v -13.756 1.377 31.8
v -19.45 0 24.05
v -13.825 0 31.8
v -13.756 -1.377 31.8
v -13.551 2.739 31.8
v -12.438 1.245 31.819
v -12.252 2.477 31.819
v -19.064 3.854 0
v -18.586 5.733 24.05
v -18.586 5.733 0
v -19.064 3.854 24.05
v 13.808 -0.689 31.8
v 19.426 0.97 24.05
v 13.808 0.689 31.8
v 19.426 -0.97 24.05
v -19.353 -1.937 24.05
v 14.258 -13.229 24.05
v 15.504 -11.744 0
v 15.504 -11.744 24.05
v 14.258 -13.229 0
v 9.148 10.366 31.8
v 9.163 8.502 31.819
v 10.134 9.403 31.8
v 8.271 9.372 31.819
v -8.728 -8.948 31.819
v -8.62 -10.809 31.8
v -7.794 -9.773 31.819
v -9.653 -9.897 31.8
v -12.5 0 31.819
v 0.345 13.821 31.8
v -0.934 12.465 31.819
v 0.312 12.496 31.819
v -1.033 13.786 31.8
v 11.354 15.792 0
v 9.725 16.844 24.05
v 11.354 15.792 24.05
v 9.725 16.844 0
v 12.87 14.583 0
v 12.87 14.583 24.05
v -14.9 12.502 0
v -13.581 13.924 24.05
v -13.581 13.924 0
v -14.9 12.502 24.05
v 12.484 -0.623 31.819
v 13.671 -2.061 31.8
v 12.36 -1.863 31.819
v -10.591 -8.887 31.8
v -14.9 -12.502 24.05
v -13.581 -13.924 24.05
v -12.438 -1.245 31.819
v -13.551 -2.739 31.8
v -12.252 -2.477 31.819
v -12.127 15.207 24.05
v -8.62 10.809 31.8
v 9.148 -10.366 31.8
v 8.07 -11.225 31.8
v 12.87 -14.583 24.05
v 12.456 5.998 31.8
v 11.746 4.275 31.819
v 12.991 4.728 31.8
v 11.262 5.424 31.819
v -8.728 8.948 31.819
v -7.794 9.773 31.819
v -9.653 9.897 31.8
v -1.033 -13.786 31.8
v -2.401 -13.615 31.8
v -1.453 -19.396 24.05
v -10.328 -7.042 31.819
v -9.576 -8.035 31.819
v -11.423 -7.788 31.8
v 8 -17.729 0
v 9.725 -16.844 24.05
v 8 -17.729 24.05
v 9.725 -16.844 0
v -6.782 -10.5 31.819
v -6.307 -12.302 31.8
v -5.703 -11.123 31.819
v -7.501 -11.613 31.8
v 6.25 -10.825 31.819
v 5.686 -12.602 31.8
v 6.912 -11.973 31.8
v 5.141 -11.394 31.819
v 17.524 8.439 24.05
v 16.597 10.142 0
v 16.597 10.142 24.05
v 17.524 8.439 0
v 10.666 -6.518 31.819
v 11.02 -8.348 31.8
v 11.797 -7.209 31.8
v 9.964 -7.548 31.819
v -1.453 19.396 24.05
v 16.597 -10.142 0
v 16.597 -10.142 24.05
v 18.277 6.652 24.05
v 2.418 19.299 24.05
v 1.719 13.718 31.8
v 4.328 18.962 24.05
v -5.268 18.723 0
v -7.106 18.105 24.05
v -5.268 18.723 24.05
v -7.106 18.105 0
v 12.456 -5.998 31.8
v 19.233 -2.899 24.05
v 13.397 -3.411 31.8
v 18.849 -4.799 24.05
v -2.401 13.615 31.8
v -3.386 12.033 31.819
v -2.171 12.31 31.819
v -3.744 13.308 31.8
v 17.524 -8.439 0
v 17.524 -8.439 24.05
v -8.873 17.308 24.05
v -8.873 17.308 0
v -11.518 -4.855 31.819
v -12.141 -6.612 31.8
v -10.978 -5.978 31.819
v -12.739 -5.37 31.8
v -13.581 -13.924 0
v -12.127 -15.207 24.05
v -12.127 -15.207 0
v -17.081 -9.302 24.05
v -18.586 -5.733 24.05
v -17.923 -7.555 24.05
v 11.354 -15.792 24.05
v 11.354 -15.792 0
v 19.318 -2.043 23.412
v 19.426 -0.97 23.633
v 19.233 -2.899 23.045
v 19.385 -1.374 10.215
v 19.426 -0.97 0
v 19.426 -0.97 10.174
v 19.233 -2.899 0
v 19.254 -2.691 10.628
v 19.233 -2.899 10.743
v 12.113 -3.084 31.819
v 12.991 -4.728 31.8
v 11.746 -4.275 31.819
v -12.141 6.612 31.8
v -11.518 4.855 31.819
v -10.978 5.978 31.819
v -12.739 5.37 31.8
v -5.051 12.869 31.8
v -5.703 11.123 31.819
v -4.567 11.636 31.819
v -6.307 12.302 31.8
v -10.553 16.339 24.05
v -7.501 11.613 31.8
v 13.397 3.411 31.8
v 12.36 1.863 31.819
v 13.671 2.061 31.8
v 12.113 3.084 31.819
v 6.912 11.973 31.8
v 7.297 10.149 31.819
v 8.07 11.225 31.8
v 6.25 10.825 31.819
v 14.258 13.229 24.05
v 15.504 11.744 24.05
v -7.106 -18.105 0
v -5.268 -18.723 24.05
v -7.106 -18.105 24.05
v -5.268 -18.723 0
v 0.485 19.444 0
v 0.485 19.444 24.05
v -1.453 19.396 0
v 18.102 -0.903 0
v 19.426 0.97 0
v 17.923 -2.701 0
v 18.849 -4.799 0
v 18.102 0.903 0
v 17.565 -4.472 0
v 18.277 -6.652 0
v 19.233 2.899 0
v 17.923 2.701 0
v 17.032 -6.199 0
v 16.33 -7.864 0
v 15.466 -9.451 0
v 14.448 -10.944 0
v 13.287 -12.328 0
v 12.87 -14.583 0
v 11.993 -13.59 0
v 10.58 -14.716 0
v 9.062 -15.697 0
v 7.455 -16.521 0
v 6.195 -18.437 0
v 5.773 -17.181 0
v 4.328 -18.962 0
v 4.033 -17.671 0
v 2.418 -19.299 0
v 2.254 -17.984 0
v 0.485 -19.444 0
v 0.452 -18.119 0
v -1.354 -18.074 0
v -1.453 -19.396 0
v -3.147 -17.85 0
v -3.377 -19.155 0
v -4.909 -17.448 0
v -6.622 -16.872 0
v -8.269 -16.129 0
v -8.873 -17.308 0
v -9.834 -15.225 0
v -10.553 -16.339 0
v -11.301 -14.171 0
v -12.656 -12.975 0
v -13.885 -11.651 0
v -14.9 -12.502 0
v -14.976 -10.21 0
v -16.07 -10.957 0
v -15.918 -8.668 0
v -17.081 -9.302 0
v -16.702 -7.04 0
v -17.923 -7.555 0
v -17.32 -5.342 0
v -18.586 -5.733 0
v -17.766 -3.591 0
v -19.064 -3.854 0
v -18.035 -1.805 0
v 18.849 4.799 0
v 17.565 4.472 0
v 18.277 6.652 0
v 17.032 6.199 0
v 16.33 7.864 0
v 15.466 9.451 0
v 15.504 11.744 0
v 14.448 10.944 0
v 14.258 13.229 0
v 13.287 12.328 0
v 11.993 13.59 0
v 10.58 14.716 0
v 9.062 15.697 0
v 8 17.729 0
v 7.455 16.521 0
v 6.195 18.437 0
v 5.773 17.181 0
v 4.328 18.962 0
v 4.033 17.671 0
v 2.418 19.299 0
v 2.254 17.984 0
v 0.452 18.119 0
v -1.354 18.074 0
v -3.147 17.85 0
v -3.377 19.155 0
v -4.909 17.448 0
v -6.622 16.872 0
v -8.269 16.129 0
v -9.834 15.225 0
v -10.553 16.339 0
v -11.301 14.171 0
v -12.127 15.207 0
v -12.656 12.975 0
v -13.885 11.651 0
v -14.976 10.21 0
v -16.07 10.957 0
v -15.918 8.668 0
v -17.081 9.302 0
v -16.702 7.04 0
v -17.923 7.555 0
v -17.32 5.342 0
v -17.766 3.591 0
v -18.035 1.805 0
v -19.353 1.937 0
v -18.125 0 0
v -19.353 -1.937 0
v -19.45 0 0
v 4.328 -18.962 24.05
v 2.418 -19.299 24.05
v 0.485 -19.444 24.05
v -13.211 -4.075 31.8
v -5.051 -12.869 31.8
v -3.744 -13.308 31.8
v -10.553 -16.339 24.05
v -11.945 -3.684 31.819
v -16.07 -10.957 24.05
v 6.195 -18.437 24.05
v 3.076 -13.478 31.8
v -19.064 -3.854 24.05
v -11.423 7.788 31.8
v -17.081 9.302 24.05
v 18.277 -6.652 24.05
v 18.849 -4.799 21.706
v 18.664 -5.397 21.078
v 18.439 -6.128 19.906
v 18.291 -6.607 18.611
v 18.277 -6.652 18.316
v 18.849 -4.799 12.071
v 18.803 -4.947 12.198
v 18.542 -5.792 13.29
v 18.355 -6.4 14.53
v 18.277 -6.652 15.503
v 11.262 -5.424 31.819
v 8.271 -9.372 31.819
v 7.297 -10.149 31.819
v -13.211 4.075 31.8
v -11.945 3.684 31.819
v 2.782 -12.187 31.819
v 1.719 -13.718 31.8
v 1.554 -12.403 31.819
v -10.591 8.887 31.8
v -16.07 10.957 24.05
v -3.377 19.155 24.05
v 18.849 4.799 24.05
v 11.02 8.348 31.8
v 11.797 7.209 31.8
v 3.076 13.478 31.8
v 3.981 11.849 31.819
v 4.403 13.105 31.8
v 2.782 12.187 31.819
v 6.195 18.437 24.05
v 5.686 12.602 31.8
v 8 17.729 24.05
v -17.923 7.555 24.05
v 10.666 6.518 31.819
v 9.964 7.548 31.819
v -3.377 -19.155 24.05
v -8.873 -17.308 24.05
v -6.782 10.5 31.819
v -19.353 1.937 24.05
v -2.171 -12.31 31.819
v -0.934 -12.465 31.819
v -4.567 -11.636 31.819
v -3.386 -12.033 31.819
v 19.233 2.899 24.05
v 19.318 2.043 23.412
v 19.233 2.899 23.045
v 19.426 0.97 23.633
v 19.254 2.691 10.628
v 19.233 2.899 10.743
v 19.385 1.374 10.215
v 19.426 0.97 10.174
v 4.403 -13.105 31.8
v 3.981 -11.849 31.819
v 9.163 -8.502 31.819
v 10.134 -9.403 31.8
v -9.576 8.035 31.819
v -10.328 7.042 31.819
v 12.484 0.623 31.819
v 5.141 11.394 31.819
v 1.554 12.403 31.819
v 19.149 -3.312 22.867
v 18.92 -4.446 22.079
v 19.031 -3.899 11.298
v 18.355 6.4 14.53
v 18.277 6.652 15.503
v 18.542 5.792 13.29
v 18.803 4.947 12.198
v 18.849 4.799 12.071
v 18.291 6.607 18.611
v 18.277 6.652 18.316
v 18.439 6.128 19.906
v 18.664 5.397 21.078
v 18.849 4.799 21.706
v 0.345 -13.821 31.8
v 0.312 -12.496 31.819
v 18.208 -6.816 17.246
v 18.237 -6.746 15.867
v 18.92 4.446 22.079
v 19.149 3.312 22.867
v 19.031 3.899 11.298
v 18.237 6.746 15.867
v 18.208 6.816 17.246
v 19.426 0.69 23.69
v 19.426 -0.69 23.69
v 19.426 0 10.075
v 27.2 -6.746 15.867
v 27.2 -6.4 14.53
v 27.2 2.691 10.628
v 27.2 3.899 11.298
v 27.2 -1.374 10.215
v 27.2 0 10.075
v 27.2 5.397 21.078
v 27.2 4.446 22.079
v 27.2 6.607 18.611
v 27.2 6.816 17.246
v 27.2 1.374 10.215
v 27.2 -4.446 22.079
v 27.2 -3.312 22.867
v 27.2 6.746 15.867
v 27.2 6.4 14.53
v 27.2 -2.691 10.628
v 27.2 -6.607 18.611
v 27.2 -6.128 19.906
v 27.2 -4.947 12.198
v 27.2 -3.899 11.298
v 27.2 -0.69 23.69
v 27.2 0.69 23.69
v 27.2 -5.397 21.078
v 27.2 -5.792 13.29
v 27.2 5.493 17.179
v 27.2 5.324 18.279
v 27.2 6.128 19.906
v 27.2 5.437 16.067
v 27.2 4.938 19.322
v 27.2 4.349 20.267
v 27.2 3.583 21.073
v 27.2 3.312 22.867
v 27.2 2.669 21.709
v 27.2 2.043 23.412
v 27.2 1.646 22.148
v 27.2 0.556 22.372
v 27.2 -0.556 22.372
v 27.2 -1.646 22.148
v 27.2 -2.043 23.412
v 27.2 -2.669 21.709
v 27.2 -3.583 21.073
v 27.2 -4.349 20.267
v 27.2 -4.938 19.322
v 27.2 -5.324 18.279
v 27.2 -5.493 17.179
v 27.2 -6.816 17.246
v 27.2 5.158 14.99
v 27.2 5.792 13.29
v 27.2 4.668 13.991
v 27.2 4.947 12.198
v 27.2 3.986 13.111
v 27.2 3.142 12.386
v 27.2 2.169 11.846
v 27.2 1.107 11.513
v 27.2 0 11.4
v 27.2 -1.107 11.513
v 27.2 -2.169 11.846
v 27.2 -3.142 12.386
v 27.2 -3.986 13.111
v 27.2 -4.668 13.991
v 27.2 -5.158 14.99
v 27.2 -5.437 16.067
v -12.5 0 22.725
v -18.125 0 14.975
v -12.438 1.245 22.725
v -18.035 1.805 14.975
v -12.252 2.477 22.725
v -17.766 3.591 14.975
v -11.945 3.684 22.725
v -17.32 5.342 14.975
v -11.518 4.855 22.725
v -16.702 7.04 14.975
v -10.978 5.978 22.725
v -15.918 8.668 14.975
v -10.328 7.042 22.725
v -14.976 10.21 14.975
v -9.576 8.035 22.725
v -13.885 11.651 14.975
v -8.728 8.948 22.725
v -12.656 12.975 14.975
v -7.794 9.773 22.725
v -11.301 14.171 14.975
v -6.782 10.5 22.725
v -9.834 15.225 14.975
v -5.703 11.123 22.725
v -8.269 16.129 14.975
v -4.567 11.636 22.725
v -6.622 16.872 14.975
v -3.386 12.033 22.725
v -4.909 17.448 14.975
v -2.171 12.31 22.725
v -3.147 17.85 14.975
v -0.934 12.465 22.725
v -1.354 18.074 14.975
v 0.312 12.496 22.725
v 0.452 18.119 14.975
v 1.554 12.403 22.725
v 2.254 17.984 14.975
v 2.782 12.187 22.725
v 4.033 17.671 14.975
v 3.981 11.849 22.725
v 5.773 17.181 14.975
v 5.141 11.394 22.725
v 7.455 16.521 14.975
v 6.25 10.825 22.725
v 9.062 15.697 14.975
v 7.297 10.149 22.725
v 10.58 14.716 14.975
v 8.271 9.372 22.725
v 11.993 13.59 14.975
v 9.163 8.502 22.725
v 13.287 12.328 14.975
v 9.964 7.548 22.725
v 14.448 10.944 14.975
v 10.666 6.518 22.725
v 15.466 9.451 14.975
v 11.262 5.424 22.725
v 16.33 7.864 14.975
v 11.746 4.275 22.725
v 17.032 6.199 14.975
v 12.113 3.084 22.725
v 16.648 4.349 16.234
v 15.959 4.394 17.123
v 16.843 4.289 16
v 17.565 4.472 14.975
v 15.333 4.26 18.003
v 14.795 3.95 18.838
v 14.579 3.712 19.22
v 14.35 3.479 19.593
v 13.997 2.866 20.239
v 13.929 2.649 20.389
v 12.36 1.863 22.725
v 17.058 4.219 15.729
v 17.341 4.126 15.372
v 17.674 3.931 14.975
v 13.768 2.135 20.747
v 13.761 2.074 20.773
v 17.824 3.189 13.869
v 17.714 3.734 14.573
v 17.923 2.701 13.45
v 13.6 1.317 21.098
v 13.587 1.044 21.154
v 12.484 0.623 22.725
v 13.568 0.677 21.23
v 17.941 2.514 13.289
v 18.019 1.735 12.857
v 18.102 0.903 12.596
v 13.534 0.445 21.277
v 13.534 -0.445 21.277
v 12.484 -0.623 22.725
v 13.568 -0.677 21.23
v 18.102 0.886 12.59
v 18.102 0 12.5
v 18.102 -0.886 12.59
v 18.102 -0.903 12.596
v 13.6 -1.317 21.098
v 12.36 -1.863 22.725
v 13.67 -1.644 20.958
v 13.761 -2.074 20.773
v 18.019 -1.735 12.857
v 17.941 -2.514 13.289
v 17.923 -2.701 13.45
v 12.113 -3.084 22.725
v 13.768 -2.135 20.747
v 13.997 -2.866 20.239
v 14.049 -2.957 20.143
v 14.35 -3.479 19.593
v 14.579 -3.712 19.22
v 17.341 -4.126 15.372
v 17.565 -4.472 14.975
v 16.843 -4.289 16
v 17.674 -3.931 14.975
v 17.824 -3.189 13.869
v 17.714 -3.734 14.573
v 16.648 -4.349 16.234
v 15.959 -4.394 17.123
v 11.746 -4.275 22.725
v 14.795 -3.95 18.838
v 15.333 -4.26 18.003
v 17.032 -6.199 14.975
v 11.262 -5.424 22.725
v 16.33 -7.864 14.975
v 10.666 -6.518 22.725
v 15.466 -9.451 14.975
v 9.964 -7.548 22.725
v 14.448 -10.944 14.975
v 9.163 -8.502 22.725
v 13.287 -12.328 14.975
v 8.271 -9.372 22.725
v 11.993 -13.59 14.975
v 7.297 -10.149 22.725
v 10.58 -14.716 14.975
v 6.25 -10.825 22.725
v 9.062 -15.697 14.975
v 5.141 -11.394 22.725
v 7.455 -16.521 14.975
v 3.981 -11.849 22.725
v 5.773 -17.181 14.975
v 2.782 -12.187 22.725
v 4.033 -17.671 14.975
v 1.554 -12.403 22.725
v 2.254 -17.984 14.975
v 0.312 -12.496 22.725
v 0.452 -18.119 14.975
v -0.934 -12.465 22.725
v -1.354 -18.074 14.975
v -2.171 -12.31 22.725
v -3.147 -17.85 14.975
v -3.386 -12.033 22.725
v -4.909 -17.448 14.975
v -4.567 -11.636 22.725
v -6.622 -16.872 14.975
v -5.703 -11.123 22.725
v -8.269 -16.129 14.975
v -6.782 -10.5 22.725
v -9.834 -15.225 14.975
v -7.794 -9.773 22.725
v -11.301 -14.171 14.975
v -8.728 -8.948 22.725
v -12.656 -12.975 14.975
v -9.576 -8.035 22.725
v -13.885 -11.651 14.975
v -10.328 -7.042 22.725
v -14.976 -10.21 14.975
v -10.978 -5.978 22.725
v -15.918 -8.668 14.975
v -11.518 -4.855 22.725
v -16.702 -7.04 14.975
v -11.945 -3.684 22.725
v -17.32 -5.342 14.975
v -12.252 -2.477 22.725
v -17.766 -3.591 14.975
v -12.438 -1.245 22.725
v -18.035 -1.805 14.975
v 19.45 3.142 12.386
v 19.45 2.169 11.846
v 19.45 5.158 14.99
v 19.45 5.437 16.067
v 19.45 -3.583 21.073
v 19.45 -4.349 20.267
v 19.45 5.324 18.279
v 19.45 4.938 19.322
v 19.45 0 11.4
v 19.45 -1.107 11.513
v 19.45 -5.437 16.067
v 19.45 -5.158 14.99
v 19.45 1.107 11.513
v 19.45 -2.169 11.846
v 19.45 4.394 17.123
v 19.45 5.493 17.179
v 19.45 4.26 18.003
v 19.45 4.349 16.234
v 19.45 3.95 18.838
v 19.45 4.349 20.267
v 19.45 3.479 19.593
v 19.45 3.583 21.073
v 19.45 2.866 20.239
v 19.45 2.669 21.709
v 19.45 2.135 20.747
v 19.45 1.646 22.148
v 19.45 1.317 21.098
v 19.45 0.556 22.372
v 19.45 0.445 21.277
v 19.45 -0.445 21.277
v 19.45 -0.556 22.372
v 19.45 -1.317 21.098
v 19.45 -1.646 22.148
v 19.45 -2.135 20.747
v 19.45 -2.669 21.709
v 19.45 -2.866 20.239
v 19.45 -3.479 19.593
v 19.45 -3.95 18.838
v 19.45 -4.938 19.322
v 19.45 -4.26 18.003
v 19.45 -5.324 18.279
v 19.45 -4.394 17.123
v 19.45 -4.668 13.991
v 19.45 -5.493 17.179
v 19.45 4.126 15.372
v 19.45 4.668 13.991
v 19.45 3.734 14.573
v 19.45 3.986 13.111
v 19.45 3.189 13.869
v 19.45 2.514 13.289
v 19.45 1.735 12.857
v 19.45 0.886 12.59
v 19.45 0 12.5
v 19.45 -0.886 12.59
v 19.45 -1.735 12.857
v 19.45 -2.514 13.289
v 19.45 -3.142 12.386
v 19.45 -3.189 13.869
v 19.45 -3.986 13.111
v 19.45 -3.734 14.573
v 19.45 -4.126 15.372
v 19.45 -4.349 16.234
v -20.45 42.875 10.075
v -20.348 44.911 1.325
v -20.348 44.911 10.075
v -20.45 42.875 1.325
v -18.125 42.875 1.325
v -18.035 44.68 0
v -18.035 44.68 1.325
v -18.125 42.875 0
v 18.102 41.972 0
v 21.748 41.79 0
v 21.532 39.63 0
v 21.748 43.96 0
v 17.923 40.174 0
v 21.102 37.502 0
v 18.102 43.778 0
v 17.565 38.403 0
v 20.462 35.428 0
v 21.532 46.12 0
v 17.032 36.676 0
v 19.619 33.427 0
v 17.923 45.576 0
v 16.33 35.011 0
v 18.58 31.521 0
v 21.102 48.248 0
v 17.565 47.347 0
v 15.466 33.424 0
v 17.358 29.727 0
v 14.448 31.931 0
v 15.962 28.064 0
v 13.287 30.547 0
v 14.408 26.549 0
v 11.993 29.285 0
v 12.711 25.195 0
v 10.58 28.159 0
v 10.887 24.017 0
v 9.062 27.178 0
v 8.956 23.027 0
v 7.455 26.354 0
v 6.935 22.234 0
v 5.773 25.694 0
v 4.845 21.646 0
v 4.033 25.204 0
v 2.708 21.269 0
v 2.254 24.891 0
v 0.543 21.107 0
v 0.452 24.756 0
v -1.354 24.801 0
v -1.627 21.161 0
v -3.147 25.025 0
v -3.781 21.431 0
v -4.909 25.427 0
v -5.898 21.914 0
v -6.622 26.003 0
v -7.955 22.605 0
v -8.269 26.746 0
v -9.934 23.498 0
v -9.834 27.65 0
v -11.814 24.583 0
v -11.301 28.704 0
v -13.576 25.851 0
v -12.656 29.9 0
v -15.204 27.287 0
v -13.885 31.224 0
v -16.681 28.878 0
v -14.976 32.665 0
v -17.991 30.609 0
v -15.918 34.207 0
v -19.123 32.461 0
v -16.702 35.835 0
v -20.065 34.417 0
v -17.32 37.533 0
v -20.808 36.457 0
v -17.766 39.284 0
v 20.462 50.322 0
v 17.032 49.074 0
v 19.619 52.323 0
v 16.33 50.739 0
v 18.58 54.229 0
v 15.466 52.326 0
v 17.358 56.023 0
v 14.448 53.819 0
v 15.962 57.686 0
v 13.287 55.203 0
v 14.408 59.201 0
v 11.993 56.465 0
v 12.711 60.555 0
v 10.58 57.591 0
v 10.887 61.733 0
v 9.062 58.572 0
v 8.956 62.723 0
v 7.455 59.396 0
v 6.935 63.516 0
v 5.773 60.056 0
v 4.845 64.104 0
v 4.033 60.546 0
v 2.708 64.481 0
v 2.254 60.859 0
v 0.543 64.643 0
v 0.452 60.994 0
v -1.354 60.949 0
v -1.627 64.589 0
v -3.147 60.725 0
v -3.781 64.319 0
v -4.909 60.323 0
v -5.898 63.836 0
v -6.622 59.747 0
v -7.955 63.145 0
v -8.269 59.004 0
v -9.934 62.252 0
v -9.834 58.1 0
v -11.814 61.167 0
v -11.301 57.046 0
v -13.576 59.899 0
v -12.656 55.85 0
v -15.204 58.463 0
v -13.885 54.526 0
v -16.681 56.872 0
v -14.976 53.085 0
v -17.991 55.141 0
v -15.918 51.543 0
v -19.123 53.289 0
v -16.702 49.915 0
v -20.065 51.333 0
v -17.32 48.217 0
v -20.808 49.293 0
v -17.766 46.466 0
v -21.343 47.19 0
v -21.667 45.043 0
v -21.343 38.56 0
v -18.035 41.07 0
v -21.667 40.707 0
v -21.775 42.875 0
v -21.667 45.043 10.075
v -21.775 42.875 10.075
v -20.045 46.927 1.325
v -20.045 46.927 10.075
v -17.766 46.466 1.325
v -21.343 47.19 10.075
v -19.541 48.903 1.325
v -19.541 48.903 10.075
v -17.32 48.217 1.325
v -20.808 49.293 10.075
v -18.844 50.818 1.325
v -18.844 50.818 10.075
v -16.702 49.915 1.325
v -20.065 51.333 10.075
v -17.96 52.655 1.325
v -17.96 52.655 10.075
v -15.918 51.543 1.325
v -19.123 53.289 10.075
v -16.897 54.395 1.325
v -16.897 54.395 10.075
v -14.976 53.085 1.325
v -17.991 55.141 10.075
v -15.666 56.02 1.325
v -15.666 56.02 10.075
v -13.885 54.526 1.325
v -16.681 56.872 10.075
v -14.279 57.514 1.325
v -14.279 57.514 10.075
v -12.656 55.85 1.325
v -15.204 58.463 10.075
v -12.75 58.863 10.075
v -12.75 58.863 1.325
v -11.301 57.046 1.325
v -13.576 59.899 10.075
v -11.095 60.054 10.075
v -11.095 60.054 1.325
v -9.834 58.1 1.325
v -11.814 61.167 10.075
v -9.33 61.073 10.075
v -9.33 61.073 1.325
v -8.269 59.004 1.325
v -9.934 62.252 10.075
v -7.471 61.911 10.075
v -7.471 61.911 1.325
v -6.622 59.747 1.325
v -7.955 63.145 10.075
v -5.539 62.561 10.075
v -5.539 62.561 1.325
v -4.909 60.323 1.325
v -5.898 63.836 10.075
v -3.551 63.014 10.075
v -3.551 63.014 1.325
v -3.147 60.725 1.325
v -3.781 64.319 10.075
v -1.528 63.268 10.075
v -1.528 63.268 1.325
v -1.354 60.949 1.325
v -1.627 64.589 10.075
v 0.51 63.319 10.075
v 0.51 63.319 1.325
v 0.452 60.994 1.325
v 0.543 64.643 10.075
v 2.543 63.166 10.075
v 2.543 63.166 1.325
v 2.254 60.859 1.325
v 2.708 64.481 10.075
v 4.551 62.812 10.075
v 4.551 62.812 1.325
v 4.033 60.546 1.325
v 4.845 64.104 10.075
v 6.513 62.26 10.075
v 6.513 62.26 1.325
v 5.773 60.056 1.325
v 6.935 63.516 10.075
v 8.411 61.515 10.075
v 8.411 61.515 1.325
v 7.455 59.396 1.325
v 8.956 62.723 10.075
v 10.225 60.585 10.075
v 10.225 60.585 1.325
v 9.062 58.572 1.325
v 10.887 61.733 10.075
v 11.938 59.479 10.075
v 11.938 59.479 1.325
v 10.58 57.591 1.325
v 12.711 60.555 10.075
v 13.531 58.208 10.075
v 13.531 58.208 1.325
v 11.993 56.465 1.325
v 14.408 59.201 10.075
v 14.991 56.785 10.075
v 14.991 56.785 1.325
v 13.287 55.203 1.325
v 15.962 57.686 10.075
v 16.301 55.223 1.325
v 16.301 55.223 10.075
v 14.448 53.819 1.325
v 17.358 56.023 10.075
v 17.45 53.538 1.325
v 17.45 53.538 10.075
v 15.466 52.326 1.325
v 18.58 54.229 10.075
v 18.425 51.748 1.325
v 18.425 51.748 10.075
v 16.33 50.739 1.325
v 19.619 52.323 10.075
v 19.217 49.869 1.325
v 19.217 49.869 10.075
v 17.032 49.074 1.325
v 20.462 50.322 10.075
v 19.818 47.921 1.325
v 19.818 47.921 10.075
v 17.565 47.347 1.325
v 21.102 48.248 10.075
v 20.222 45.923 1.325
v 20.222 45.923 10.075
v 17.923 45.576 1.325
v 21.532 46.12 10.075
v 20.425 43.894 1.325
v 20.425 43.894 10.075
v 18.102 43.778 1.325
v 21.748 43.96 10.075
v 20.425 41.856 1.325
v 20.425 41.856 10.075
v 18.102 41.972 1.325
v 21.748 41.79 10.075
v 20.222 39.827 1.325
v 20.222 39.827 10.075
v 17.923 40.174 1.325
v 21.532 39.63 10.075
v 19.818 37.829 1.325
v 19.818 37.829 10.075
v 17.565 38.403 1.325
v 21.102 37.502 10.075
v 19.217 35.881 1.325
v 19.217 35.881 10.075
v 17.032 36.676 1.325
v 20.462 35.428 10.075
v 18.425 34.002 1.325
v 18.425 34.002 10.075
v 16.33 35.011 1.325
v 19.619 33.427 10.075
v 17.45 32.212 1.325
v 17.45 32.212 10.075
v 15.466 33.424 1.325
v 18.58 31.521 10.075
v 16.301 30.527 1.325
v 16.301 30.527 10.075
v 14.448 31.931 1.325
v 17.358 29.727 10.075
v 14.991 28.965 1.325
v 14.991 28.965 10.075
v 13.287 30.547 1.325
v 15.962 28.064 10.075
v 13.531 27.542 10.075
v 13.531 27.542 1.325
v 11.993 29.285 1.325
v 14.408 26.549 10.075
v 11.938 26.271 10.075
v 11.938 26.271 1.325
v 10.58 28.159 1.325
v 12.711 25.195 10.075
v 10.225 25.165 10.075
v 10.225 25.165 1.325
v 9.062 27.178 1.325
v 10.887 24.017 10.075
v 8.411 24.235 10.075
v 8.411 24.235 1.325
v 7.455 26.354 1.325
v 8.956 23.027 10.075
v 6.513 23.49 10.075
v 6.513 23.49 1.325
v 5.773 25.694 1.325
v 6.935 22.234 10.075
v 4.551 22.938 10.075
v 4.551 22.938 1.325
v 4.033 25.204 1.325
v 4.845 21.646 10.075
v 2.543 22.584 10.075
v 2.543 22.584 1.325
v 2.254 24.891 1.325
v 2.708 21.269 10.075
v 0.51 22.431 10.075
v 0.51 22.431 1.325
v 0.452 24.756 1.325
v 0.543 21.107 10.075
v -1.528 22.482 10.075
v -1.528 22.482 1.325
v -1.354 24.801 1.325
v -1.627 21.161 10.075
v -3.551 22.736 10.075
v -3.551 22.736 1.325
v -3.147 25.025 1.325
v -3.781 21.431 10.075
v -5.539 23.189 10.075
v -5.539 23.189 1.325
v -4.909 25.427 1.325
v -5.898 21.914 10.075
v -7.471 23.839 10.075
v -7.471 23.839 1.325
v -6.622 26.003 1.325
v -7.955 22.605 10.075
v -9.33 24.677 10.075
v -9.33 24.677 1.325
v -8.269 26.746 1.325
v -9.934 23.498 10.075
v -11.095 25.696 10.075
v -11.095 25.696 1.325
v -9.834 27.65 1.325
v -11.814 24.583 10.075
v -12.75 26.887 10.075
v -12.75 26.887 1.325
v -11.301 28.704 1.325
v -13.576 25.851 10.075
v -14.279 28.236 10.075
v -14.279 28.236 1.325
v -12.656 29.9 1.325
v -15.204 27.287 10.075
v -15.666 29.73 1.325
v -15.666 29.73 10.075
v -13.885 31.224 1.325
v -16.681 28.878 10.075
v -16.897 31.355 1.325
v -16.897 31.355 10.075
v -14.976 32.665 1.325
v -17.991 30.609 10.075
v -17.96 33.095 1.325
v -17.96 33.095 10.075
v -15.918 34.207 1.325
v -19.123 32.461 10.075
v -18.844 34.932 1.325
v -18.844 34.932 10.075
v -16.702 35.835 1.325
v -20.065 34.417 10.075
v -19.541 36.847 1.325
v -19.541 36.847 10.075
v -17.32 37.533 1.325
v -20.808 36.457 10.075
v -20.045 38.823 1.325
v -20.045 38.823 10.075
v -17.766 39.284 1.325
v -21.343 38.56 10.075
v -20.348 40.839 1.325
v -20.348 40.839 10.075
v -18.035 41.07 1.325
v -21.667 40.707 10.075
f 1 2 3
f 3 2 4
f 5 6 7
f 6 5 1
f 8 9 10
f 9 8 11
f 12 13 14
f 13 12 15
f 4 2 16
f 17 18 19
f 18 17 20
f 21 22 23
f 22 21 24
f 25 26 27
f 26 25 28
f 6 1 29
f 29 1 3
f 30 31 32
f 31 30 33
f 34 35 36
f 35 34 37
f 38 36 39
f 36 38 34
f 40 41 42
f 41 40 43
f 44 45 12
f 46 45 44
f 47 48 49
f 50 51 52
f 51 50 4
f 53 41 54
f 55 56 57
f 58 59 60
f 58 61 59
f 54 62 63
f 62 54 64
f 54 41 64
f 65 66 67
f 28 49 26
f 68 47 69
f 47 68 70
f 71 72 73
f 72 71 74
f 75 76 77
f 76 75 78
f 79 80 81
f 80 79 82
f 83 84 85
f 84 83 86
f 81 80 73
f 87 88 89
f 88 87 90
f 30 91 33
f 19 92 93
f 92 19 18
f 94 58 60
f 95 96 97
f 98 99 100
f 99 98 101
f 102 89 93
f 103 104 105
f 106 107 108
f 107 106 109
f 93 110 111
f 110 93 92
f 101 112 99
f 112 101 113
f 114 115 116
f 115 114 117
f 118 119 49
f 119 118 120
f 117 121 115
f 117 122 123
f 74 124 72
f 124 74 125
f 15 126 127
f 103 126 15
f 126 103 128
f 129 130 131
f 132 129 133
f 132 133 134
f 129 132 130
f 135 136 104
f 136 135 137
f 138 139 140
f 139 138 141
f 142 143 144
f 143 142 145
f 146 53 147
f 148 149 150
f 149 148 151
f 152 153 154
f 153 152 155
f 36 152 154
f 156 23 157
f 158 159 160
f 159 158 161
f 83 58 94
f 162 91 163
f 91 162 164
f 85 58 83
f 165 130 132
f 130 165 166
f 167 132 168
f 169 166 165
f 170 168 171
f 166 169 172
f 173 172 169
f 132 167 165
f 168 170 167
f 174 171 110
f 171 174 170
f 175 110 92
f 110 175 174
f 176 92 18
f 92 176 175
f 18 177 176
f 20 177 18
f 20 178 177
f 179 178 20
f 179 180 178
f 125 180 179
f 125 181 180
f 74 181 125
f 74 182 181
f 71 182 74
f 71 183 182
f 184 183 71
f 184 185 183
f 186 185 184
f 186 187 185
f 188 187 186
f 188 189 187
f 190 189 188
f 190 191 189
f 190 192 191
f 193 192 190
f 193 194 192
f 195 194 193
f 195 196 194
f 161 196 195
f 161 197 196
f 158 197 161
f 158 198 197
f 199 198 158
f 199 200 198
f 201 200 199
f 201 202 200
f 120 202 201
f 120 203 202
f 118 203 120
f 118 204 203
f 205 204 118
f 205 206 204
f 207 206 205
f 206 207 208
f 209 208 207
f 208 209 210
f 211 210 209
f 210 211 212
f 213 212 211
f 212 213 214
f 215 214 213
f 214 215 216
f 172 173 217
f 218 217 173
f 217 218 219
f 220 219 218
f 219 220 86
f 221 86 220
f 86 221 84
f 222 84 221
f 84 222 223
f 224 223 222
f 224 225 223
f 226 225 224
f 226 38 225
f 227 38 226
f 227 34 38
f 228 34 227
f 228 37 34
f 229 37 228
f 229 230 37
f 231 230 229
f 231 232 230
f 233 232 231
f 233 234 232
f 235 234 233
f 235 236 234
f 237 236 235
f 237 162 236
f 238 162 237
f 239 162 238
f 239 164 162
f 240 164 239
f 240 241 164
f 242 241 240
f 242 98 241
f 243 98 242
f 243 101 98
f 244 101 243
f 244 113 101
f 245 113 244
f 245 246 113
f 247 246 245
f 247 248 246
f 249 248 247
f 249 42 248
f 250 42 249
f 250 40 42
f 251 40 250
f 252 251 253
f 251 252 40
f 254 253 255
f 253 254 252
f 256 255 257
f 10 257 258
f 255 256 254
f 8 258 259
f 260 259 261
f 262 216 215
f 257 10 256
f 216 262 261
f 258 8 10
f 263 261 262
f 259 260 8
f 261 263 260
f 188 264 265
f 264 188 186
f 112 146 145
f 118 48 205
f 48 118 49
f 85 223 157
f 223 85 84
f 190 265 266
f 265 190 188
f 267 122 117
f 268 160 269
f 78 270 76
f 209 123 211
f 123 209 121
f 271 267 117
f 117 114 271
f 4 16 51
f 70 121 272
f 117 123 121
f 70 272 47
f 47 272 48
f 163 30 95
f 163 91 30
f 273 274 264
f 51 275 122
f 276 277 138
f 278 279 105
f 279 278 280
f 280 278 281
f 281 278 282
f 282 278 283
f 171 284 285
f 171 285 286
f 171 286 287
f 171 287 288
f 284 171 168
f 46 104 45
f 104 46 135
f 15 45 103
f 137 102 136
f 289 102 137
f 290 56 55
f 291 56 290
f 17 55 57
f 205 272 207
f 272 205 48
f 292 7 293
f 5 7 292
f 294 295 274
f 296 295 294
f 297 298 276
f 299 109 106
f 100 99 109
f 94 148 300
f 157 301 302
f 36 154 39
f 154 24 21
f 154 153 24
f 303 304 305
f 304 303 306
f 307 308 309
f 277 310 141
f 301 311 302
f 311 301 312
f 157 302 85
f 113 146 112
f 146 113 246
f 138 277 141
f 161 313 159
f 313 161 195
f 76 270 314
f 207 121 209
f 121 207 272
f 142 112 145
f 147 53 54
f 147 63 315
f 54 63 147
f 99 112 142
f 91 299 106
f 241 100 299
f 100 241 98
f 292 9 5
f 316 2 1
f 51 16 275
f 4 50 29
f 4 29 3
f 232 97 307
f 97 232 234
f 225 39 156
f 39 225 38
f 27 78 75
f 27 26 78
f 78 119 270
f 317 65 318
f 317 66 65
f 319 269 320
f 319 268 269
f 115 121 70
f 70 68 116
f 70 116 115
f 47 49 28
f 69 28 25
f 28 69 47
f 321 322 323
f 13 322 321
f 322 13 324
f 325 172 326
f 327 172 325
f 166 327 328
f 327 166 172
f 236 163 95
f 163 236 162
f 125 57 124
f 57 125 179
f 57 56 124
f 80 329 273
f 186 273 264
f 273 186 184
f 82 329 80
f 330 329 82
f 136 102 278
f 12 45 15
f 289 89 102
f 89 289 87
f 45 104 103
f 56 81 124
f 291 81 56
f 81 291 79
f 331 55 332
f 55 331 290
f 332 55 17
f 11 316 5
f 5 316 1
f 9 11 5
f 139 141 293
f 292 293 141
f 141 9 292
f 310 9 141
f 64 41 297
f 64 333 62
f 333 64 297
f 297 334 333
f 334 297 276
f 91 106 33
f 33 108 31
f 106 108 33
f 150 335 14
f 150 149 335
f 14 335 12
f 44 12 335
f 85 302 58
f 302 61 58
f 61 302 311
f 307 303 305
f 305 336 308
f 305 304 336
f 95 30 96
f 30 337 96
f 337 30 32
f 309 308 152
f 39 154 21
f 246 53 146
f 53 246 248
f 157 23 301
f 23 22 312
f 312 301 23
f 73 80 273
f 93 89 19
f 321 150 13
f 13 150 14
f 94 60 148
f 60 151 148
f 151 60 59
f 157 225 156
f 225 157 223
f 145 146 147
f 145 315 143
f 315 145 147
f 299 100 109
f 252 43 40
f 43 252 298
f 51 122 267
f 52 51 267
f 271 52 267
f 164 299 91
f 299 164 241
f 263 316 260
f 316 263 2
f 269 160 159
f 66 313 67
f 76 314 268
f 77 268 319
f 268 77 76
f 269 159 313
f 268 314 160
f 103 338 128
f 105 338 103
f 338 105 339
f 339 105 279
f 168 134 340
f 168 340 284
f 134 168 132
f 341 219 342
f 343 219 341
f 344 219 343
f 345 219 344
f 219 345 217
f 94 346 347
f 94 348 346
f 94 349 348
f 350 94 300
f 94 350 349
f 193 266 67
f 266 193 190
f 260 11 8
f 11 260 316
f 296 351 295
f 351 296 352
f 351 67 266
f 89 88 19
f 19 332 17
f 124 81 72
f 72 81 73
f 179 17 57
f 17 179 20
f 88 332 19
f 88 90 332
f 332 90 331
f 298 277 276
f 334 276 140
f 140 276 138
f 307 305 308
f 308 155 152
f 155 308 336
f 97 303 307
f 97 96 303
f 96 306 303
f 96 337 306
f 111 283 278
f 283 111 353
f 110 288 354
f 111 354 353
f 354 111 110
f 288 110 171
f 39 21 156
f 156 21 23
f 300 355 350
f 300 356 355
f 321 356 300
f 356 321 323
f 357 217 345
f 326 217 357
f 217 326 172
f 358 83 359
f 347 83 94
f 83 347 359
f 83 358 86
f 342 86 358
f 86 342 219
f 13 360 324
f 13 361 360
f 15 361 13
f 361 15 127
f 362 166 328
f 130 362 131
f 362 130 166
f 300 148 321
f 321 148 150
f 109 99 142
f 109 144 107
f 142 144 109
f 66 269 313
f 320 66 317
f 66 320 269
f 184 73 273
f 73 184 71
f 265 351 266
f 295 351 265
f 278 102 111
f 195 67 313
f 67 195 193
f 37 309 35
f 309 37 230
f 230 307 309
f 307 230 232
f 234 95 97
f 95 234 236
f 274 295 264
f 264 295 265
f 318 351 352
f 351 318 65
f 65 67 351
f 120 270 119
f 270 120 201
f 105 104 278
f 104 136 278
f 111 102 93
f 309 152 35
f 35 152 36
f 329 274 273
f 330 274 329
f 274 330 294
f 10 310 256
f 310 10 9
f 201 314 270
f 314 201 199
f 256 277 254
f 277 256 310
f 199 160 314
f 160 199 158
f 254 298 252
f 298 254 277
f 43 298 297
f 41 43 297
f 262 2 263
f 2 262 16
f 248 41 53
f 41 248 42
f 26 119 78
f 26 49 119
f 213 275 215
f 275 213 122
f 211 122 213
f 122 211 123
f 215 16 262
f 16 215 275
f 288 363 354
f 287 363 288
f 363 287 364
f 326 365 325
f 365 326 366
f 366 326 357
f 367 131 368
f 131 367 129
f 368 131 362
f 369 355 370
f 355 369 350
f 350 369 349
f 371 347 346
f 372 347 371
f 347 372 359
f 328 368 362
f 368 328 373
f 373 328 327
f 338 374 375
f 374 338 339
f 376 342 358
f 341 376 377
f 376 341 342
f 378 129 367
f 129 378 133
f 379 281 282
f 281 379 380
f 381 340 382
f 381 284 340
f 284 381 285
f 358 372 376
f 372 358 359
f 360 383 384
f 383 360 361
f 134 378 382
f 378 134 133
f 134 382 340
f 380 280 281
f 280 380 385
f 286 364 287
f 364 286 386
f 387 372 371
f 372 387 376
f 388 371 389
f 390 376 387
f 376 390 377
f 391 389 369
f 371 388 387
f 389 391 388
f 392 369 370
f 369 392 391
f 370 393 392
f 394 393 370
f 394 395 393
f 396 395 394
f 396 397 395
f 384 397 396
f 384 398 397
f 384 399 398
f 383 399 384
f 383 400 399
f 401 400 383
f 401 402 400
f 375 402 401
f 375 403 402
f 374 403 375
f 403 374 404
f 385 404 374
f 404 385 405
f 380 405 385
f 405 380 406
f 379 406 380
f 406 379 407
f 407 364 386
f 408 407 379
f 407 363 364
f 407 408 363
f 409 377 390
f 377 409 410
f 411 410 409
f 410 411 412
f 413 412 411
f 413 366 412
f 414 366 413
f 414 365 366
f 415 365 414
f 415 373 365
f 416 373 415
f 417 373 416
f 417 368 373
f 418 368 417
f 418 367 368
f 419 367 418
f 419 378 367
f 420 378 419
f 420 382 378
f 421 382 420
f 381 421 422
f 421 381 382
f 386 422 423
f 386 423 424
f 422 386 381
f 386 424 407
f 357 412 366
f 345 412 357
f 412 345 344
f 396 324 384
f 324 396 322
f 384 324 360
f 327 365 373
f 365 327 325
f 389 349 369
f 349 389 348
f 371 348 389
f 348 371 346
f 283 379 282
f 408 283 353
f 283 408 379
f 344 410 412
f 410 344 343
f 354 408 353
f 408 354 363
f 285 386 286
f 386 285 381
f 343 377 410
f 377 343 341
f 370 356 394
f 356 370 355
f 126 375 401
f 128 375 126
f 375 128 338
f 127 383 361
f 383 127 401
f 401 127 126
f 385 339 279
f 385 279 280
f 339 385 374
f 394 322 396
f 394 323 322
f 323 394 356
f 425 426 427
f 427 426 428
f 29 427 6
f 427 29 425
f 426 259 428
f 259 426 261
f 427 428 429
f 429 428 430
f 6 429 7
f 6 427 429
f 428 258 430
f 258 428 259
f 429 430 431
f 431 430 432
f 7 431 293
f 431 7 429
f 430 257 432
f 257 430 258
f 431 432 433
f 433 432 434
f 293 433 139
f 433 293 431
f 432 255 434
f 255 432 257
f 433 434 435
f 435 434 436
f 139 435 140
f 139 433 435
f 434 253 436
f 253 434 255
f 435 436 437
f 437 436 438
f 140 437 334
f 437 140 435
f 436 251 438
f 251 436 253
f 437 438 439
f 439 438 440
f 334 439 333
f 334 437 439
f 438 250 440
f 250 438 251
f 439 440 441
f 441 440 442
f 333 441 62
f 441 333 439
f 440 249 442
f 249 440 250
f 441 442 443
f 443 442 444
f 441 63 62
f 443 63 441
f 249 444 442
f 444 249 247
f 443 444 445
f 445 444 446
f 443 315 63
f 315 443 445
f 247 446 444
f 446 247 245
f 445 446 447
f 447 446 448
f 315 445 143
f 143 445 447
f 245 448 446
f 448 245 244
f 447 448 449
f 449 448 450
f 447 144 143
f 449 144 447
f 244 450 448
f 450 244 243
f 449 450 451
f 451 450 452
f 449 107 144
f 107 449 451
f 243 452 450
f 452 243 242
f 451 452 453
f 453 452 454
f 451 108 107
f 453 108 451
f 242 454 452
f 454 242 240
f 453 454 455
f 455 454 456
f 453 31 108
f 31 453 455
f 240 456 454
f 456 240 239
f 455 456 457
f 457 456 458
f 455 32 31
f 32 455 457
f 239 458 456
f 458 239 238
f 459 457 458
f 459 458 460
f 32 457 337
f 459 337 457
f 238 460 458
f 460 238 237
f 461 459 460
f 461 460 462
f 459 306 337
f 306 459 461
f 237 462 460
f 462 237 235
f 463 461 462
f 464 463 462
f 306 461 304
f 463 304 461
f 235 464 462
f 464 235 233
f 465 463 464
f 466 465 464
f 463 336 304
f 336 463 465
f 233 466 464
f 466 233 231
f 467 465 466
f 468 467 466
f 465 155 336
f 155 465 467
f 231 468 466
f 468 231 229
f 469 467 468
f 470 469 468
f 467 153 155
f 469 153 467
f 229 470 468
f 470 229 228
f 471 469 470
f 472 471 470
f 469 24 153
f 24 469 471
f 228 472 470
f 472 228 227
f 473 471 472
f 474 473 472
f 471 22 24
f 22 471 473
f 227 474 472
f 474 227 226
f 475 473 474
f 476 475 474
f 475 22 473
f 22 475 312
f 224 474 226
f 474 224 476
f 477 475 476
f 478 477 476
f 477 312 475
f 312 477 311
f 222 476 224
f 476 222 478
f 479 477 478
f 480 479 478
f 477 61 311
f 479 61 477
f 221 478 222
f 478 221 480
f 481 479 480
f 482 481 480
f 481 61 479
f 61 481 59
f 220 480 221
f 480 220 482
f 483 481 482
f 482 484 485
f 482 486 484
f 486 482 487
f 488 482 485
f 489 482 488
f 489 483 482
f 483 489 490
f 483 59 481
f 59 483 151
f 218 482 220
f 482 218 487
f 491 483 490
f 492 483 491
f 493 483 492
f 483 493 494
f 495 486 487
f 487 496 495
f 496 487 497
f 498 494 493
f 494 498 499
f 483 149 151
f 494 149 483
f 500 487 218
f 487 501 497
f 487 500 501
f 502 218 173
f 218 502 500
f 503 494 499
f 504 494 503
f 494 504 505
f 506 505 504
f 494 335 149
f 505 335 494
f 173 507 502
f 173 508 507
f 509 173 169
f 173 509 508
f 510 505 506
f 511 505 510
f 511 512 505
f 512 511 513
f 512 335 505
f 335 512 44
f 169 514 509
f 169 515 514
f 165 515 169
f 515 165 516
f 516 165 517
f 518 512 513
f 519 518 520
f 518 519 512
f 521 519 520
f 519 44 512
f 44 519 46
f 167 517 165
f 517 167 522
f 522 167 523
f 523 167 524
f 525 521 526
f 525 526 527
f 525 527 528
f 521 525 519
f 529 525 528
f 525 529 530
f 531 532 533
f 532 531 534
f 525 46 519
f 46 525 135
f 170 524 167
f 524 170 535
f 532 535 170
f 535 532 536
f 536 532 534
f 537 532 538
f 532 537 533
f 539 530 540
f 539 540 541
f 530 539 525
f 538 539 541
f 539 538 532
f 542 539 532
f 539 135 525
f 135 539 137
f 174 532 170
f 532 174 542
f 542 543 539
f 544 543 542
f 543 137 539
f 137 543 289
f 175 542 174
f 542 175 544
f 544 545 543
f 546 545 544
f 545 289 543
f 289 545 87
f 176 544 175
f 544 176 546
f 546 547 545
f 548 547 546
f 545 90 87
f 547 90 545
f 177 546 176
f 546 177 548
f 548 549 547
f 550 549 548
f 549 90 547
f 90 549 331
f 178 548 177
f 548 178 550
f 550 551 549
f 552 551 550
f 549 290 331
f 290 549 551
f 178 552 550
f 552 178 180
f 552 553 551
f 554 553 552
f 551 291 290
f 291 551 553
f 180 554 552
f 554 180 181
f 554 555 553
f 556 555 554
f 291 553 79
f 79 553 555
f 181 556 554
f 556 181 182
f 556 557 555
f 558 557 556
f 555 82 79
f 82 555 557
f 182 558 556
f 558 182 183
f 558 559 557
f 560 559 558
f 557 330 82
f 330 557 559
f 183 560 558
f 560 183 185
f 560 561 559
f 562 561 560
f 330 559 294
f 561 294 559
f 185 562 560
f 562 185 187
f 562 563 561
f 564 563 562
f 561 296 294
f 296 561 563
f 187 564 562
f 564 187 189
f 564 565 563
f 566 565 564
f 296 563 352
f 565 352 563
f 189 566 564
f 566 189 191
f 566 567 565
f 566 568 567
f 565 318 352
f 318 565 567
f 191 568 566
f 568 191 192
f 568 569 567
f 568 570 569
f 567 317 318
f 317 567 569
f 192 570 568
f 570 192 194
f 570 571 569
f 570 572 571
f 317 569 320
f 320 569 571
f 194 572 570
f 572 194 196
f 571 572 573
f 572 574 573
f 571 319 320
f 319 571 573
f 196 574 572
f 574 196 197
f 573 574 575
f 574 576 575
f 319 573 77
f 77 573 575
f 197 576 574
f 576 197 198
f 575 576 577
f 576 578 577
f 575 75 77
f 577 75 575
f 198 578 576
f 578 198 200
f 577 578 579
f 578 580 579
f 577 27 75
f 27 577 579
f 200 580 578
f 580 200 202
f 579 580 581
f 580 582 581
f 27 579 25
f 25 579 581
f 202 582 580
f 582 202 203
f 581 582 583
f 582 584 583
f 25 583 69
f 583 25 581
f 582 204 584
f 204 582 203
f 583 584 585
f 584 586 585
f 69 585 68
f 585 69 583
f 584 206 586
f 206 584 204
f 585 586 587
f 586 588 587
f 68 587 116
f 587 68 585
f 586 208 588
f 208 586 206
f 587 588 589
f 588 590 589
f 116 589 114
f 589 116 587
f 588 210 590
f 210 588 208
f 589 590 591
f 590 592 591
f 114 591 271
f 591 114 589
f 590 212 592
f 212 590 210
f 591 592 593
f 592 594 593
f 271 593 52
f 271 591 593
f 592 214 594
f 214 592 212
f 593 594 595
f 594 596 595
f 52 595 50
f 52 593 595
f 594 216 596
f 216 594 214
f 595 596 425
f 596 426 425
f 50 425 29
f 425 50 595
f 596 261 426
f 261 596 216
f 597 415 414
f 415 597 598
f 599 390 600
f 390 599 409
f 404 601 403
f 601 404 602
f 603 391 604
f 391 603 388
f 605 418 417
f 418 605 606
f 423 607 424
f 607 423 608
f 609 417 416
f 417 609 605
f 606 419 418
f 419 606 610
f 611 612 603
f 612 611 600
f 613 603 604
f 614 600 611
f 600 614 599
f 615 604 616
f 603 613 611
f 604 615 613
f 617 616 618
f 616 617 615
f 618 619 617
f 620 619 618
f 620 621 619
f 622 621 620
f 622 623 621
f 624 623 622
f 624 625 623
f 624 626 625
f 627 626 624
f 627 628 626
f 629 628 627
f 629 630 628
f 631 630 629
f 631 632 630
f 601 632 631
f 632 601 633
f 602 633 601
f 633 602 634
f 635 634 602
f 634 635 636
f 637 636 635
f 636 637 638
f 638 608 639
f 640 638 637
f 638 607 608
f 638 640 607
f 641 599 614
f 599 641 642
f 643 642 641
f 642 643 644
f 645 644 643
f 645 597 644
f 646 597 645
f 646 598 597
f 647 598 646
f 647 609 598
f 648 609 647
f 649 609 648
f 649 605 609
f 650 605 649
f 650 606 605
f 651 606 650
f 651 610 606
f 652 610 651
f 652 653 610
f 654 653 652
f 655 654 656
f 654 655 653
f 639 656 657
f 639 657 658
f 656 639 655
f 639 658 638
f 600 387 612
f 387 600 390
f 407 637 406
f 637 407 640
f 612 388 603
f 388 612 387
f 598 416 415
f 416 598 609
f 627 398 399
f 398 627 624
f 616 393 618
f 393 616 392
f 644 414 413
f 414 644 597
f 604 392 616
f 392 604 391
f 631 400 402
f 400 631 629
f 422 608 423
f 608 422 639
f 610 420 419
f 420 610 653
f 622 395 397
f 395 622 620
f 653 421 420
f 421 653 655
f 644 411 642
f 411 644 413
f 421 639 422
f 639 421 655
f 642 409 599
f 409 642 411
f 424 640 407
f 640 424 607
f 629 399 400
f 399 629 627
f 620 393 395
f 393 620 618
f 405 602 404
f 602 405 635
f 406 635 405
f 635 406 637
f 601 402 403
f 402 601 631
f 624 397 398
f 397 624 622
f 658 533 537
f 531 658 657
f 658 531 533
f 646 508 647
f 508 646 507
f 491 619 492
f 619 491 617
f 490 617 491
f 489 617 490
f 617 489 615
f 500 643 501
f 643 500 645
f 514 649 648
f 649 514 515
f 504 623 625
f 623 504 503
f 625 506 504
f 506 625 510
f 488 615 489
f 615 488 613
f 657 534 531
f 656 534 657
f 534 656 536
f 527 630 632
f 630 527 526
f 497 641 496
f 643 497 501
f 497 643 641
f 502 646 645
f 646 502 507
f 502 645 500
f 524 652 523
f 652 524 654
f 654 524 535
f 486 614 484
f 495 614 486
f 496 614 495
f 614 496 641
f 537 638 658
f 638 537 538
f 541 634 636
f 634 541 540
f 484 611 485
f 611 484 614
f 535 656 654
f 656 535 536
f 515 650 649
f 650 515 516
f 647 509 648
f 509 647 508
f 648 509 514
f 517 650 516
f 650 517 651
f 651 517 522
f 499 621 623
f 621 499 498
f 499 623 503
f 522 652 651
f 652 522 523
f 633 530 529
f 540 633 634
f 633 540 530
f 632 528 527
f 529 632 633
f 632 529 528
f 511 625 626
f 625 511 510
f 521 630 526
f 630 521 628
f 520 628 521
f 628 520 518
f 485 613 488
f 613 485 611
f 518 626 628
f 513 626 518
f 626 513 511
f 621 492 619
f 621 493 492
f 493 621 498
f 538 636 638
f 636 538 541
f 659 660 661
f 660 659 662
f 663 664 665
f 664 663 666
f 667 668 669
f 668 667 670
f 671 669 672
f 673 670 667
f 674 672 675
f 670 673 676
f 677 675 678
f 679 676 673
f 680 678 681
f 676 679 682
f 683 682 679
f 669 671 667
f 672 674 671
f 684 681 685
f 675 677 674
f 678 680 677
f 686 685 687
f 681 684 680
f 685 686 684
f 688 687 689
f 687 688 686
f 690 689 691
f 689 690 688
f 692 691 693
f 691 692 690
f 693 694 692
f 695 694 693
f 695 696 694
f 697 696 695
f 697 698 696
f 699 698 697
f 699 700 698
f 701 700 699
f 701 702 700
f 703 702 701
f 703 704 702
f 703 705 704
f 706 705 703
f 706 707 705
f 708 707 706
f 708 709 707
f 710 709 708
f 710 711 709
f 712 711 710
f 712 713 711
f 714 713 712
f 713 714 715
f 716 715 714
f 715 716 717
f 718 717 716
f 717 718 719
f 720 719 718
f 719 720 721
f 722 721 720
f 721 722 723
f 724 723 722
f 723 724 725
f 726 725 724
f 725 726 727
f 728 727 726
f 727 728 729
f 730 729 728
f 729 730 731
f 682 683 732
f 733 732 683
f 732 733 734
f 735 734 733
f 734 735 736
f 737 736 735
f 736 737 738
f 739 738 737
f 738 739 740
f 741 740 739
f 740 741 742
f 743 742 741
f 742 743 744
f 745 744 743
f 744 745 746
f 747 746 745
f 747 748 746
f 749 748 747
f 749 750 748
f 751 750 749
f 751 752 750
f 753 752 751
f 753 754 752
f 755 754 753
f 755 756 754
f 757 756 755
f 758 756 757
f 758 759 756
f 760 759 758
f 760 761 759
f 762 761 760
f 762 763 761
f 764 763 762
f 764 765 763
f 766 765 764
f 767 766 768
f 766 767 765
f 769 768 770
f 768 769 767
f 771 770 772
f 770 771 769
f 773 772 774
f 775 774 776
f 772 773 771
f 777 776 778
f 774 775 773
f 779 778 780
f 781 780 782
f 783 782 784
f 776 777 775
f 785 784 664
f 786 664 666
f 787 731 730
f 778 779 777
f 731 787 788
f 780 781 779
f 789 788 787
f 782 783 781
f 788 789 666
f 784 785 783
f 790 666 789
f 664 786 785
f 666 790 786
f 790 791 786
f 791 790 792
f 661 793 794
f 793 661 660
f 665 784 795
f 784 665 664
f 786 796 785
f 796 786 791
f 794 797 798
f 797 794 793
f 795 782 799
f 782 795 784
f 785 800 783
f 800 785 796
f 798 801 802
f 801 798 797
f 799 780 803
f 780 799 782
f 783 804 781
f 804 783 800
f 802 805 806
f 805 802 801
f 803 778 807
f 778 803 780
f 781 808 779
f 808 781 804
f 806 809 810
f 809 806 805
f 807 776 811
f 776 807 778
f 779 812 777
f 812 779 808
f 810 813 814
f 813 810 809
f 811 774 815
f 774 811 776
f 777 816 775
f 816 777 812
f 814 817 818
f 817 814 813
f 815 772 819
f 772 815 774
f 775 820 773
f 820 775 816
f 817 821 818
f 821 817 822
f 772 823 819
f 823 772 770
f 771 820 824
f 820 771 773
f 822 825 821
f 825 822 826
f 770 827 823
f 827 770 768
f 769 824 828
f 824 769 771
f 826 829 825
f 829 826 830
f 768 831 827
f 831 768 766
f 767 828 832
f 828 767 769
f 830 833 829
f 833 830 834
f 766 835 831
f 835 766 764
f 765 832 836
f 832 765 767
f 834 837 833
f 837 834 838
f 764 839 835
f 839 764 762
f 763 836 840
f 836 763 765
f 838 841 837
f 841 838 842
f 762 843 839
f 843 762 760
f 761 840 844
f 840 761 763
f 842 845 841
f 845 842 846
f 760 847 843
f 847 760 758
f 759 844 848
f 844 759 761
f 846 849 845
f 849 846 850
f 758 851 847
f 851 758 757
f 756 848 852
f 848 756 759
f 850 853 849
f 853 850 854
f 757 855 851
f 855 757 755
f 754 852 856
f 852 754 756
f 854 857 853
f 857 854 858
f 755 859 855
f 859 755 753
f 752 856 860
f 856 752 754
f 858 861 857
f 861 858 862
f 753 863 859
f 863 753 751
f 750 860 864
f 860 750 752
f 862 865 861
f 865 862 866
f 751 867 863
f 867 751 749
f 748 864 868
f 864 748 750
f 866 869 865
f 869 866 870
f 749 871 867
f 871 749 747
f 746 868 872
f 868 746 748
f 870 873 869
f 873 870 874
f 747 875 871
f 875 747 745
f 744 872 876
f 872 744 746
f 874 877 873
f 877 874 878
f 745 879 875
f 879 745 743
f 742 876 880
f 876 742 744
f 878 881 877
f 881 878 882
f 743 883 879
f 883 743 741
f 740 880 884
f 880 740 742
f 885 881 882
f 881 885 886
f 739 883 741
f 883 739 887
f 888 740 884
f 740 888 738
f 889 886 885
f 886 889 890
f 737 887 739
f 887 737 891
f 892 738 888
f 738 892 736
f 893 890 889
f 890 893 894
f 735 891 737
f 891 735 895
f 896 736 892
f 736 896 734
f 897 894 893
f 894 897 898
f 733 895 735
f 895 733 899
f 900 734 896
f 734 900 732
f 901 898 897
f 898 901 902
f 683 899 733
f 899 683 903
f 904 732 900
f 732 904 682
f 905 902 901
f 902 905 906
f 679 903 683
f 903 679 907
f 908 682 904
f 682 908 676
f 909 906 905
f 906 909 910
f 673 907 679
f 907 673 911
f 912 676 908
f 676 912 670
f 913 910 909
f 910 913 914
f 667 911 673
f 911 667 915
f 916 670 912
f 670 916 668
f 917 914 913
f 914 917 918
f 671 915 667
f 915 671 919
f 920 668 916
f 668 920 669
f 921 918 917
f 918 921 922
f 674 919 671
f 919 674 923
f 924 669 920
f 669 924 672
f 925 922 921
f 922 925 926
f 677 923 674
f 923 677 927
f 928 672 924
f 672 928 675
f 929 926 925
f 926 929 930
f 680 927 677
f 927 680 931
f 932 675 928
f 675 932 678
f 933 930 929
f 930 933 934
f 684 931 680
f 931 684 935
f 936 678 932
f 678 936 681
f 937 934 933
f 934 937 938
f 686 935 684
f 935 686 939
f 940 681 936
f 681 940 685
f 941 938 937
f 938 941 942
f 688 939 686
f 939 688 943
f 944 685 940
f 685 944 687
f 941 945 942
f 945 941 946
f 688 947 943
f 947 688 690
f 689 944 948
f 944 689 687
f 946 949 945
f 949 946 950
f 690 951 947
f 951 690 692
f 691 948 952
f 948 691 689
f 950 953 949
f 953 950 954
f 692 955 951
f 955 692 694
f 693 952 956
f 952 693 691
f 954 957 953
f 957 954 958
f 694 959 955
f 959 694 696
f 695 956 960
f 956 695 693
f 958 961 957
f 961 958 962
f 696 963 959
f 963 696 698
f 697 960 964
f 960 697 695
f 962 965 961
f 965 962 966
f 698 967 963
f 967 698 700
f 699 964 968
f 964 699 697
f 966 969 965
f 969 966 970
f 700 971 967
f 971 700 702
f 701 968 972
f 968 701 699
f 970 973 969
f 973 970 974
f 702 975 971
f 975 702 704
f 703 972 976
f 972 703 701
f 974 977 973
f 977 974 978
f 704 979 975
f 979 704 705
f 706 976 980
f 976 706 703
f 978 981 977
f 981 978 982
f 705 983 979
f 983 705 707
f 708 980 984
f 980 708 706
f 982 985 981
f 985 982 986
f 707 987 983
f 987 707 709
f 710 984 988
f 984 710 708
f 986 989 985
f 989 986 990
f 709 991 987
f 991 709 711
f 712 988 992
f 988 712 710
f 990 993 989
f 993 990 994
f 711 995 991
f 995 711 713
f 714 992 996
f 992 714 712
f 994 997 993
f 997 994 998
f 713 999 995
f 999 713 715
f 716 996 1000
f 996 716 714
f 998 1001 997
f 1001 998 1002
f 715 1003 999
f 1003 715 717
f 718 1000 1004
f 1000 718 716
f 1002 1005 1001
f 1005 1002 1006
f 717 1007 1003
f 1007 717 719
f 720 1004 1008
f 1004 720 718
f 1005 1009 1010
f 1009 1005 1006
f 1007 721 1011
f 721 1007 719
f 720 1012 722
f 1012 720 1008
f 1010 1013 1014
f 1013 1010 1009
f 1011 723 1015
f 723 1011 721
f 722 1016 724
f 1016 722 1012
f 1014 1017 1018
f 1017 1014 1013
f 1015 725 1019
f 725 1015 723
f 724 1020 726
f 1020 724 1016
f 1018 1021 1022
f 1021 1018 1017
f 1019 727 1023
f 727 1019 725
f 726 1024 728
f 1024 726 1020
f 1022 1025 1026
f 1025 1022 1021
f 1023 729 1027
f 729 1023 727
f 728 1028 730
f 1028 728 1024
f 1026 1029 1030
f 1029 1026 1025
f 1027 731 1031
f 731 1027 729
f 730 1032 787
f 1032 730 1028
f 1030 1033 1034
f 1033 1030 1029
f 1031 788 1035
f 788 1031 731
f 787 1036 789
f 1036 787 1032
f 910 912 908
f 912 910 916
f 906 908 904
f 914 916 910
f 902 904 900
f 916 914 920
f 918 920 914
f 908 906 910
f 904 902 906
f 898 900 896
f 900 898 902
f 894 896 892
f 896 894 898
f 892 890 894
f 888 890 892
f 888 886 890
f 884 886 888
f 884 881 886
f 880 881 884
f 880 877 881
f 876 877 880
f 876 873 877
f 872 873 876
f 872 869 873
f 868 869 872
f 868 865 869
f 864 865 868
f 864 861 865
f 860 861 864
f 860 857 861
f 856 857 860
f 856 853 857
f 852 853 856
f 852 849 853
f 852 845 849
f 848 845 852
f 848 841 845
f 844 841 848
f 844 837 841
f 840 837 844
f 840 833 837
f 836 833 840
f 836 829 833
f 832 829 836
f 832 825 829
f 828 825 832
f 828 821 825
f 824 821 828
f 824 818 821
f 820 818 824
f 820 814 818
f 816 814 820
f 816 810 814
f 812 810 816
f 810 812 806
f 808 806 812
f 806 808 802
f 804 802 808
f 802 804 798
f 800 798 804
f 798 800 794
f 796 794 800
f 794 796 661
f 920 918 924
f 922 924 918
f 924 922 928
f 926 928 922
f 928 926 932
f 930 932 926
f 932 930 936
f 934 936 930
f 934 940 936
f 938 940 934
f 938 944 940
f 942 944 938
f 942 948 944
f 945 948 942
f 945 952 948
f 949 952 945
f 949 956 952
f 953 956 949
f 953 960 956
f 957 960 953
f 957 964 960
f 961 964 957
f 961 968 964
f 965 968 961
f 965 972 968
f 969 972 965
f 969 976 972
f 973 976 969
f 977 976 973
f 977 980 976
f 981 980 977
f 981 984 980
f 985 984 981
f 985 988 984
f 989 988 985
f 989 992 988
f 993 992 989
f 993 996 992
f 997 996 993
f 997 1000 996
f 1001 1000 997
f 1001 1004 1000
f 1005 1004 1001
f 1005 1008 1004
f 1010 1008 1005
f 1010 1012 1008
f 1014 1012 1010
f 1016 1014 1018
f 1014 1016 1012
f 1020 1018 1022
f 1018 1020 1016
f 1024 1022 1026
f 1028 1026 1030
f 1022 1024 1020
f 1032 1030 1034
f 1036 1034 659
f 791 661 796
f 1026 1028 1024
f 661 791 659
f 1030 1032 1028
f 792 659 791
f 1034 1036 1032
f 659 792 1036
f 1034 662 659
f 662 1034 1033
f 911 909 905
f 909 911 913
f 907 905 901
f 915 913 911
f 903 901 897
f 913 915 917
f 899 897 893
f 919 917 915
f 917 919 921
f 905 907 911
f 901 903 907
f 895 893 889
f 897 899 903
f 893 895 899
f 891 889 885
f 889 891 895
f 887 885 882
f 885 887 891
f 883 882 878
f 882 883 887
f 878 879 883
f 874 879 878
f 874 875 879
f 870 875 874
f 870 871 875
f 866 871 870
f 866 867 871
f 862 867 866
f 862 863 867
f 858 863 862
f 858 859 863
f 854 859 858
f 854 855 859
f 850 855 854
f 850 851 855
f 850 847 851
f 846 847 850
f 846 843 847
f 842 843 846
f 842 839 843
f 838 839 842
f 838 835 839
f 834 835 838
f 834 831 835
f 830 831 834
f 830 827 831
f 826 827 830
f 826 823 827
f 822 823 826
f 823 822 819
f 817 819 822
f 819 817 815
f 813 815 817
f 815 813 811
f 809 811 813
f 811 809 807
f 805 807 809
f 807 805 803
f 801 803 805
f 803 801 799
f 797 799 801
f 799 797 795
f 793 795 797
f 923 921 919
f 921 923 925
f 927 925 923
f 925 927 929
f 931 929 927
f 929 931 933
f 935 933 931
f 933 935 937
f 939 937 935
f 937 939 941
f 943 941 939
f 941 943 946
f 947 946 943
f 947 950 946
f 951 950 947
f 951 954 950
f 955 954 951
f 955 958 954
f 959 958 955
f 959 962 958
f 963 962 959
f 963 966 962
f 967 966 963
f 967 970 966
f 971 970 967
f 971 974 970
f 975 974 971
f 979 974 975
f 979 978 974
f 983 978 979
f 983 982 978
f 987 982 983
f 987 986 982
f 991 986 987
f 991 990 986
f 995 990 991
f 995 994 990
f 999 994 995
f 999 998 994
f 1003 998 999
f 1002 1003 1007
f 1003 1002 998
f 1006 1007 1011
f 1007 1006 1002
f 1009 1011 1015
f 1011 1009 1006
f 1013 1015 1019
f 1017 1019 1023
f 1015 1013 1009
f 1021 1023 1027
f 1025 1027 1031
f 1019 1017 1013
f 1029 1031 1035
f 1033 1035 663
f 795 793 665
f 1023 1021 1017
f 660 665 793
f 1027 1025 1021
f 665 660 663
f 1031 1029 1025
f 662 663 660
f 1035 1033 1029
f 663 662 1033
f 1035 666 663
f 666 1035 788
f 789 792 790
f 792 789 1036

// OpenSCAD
// adjust those
pipe_diameter = 25;
tube_diameter = 11;     // air suppy tube, doesn't matter if you use your mouth
rubber_thickness = 1;

// probably don't change those
min_wall = 1.2 + pipe_diameter * 0.005;

// proportions
inner_diameter = pipe_diameter * 1.25 + 5;
stuck_width = pipe_diameter*0.15 + 4;
fn = round(pipe_diameter * 2.5);

// inner part
difference(){
    union(){
        rotate_extrude($fn=fn) polygon
            (points=[
                [0, 0],
                [inner_diameter/2 + min_wall,0],
                [inner_diameter/2 + min_wall, stuck_width + min_wall*4 + tube_diameter],
                [pipe_diameter/2 + min_wall, stuck_width*2 + min_wall*4 + tube_diameter],
                [0, stuck_width + min_wall*10 + tube_diameter]]);
        translate ([0, 0, stuck_width + min_wall*2 + tube_diameter/2+ rubber_thickness])
            rotate ([0, 90, 0])
                cylinder 
                    (inner_diameter/2 + min_wall + stuck_width, 
                    tube_diameter/2 + min_wall, tube_diameter/2 + min_wall, $fn=fn/2);
    };
     union(){
        rotate_extrude($fn=fn) polygon
            (points=[
                [0, -1],
                [inner_diameter/2, -1],
                [inner_diameter/2, min_wall*3 + tube_diameter],
                [pipe_diameter/2, stuck_width + min_wall*3 + tube_diameter],
                [pipe_diameter/2, stuck_width*2 + min_wall*4 + tube_diameter +1],
                [0, stuck_width + min_wall*10 + tube_diameter +1]]);
        translate ([inner_diameter/2 + min_wall, 0, stuck_width + min_wall*2 + tube_diameter/2 + rubber_thickness])
            rotate ([0, 90, 0])
                cylinder 
                    (inner_diameter/2 + min_wall + stuck_width, 
                    tube_diameter/2, tube_diameter/2, $fn=fn/2);
         translate ([0, 0, stuck_width + min_wall*2 + tube_diameter/2 + rubber_thickness])
            rotate ([0, 90, 0])
                cylinder 
                    (inner_diameter/2 + min_wall + stuck_width, 
                    tube_diameter*0.4, tube_diameter*0.4, $fn=fn/2);
    };   
}

// outer part
translate([0, inner_diameter + 5*min_wall, min_wall + rubber_thickness])
rotate_extrude($fn=fn) polygon
    (points=[
        [inner_diameter/2, -rubber_thickness - min_wall],
        [inner_diameter/2 + min_wall*2 + rubber_thickness, -rubber_thickness - min_wall],
        [inner_diameter/2 + min_wall*2 + rubber_thickness, stuck_width],
        [inner_diameter/2 + min_wall + rubber_thickness, stuck_width],
        [inner_diameter/2 + min_wall + rubber_thickness, -rubber_thickness],
        [inner_diameter/2, -rubber_thickness]]);  
